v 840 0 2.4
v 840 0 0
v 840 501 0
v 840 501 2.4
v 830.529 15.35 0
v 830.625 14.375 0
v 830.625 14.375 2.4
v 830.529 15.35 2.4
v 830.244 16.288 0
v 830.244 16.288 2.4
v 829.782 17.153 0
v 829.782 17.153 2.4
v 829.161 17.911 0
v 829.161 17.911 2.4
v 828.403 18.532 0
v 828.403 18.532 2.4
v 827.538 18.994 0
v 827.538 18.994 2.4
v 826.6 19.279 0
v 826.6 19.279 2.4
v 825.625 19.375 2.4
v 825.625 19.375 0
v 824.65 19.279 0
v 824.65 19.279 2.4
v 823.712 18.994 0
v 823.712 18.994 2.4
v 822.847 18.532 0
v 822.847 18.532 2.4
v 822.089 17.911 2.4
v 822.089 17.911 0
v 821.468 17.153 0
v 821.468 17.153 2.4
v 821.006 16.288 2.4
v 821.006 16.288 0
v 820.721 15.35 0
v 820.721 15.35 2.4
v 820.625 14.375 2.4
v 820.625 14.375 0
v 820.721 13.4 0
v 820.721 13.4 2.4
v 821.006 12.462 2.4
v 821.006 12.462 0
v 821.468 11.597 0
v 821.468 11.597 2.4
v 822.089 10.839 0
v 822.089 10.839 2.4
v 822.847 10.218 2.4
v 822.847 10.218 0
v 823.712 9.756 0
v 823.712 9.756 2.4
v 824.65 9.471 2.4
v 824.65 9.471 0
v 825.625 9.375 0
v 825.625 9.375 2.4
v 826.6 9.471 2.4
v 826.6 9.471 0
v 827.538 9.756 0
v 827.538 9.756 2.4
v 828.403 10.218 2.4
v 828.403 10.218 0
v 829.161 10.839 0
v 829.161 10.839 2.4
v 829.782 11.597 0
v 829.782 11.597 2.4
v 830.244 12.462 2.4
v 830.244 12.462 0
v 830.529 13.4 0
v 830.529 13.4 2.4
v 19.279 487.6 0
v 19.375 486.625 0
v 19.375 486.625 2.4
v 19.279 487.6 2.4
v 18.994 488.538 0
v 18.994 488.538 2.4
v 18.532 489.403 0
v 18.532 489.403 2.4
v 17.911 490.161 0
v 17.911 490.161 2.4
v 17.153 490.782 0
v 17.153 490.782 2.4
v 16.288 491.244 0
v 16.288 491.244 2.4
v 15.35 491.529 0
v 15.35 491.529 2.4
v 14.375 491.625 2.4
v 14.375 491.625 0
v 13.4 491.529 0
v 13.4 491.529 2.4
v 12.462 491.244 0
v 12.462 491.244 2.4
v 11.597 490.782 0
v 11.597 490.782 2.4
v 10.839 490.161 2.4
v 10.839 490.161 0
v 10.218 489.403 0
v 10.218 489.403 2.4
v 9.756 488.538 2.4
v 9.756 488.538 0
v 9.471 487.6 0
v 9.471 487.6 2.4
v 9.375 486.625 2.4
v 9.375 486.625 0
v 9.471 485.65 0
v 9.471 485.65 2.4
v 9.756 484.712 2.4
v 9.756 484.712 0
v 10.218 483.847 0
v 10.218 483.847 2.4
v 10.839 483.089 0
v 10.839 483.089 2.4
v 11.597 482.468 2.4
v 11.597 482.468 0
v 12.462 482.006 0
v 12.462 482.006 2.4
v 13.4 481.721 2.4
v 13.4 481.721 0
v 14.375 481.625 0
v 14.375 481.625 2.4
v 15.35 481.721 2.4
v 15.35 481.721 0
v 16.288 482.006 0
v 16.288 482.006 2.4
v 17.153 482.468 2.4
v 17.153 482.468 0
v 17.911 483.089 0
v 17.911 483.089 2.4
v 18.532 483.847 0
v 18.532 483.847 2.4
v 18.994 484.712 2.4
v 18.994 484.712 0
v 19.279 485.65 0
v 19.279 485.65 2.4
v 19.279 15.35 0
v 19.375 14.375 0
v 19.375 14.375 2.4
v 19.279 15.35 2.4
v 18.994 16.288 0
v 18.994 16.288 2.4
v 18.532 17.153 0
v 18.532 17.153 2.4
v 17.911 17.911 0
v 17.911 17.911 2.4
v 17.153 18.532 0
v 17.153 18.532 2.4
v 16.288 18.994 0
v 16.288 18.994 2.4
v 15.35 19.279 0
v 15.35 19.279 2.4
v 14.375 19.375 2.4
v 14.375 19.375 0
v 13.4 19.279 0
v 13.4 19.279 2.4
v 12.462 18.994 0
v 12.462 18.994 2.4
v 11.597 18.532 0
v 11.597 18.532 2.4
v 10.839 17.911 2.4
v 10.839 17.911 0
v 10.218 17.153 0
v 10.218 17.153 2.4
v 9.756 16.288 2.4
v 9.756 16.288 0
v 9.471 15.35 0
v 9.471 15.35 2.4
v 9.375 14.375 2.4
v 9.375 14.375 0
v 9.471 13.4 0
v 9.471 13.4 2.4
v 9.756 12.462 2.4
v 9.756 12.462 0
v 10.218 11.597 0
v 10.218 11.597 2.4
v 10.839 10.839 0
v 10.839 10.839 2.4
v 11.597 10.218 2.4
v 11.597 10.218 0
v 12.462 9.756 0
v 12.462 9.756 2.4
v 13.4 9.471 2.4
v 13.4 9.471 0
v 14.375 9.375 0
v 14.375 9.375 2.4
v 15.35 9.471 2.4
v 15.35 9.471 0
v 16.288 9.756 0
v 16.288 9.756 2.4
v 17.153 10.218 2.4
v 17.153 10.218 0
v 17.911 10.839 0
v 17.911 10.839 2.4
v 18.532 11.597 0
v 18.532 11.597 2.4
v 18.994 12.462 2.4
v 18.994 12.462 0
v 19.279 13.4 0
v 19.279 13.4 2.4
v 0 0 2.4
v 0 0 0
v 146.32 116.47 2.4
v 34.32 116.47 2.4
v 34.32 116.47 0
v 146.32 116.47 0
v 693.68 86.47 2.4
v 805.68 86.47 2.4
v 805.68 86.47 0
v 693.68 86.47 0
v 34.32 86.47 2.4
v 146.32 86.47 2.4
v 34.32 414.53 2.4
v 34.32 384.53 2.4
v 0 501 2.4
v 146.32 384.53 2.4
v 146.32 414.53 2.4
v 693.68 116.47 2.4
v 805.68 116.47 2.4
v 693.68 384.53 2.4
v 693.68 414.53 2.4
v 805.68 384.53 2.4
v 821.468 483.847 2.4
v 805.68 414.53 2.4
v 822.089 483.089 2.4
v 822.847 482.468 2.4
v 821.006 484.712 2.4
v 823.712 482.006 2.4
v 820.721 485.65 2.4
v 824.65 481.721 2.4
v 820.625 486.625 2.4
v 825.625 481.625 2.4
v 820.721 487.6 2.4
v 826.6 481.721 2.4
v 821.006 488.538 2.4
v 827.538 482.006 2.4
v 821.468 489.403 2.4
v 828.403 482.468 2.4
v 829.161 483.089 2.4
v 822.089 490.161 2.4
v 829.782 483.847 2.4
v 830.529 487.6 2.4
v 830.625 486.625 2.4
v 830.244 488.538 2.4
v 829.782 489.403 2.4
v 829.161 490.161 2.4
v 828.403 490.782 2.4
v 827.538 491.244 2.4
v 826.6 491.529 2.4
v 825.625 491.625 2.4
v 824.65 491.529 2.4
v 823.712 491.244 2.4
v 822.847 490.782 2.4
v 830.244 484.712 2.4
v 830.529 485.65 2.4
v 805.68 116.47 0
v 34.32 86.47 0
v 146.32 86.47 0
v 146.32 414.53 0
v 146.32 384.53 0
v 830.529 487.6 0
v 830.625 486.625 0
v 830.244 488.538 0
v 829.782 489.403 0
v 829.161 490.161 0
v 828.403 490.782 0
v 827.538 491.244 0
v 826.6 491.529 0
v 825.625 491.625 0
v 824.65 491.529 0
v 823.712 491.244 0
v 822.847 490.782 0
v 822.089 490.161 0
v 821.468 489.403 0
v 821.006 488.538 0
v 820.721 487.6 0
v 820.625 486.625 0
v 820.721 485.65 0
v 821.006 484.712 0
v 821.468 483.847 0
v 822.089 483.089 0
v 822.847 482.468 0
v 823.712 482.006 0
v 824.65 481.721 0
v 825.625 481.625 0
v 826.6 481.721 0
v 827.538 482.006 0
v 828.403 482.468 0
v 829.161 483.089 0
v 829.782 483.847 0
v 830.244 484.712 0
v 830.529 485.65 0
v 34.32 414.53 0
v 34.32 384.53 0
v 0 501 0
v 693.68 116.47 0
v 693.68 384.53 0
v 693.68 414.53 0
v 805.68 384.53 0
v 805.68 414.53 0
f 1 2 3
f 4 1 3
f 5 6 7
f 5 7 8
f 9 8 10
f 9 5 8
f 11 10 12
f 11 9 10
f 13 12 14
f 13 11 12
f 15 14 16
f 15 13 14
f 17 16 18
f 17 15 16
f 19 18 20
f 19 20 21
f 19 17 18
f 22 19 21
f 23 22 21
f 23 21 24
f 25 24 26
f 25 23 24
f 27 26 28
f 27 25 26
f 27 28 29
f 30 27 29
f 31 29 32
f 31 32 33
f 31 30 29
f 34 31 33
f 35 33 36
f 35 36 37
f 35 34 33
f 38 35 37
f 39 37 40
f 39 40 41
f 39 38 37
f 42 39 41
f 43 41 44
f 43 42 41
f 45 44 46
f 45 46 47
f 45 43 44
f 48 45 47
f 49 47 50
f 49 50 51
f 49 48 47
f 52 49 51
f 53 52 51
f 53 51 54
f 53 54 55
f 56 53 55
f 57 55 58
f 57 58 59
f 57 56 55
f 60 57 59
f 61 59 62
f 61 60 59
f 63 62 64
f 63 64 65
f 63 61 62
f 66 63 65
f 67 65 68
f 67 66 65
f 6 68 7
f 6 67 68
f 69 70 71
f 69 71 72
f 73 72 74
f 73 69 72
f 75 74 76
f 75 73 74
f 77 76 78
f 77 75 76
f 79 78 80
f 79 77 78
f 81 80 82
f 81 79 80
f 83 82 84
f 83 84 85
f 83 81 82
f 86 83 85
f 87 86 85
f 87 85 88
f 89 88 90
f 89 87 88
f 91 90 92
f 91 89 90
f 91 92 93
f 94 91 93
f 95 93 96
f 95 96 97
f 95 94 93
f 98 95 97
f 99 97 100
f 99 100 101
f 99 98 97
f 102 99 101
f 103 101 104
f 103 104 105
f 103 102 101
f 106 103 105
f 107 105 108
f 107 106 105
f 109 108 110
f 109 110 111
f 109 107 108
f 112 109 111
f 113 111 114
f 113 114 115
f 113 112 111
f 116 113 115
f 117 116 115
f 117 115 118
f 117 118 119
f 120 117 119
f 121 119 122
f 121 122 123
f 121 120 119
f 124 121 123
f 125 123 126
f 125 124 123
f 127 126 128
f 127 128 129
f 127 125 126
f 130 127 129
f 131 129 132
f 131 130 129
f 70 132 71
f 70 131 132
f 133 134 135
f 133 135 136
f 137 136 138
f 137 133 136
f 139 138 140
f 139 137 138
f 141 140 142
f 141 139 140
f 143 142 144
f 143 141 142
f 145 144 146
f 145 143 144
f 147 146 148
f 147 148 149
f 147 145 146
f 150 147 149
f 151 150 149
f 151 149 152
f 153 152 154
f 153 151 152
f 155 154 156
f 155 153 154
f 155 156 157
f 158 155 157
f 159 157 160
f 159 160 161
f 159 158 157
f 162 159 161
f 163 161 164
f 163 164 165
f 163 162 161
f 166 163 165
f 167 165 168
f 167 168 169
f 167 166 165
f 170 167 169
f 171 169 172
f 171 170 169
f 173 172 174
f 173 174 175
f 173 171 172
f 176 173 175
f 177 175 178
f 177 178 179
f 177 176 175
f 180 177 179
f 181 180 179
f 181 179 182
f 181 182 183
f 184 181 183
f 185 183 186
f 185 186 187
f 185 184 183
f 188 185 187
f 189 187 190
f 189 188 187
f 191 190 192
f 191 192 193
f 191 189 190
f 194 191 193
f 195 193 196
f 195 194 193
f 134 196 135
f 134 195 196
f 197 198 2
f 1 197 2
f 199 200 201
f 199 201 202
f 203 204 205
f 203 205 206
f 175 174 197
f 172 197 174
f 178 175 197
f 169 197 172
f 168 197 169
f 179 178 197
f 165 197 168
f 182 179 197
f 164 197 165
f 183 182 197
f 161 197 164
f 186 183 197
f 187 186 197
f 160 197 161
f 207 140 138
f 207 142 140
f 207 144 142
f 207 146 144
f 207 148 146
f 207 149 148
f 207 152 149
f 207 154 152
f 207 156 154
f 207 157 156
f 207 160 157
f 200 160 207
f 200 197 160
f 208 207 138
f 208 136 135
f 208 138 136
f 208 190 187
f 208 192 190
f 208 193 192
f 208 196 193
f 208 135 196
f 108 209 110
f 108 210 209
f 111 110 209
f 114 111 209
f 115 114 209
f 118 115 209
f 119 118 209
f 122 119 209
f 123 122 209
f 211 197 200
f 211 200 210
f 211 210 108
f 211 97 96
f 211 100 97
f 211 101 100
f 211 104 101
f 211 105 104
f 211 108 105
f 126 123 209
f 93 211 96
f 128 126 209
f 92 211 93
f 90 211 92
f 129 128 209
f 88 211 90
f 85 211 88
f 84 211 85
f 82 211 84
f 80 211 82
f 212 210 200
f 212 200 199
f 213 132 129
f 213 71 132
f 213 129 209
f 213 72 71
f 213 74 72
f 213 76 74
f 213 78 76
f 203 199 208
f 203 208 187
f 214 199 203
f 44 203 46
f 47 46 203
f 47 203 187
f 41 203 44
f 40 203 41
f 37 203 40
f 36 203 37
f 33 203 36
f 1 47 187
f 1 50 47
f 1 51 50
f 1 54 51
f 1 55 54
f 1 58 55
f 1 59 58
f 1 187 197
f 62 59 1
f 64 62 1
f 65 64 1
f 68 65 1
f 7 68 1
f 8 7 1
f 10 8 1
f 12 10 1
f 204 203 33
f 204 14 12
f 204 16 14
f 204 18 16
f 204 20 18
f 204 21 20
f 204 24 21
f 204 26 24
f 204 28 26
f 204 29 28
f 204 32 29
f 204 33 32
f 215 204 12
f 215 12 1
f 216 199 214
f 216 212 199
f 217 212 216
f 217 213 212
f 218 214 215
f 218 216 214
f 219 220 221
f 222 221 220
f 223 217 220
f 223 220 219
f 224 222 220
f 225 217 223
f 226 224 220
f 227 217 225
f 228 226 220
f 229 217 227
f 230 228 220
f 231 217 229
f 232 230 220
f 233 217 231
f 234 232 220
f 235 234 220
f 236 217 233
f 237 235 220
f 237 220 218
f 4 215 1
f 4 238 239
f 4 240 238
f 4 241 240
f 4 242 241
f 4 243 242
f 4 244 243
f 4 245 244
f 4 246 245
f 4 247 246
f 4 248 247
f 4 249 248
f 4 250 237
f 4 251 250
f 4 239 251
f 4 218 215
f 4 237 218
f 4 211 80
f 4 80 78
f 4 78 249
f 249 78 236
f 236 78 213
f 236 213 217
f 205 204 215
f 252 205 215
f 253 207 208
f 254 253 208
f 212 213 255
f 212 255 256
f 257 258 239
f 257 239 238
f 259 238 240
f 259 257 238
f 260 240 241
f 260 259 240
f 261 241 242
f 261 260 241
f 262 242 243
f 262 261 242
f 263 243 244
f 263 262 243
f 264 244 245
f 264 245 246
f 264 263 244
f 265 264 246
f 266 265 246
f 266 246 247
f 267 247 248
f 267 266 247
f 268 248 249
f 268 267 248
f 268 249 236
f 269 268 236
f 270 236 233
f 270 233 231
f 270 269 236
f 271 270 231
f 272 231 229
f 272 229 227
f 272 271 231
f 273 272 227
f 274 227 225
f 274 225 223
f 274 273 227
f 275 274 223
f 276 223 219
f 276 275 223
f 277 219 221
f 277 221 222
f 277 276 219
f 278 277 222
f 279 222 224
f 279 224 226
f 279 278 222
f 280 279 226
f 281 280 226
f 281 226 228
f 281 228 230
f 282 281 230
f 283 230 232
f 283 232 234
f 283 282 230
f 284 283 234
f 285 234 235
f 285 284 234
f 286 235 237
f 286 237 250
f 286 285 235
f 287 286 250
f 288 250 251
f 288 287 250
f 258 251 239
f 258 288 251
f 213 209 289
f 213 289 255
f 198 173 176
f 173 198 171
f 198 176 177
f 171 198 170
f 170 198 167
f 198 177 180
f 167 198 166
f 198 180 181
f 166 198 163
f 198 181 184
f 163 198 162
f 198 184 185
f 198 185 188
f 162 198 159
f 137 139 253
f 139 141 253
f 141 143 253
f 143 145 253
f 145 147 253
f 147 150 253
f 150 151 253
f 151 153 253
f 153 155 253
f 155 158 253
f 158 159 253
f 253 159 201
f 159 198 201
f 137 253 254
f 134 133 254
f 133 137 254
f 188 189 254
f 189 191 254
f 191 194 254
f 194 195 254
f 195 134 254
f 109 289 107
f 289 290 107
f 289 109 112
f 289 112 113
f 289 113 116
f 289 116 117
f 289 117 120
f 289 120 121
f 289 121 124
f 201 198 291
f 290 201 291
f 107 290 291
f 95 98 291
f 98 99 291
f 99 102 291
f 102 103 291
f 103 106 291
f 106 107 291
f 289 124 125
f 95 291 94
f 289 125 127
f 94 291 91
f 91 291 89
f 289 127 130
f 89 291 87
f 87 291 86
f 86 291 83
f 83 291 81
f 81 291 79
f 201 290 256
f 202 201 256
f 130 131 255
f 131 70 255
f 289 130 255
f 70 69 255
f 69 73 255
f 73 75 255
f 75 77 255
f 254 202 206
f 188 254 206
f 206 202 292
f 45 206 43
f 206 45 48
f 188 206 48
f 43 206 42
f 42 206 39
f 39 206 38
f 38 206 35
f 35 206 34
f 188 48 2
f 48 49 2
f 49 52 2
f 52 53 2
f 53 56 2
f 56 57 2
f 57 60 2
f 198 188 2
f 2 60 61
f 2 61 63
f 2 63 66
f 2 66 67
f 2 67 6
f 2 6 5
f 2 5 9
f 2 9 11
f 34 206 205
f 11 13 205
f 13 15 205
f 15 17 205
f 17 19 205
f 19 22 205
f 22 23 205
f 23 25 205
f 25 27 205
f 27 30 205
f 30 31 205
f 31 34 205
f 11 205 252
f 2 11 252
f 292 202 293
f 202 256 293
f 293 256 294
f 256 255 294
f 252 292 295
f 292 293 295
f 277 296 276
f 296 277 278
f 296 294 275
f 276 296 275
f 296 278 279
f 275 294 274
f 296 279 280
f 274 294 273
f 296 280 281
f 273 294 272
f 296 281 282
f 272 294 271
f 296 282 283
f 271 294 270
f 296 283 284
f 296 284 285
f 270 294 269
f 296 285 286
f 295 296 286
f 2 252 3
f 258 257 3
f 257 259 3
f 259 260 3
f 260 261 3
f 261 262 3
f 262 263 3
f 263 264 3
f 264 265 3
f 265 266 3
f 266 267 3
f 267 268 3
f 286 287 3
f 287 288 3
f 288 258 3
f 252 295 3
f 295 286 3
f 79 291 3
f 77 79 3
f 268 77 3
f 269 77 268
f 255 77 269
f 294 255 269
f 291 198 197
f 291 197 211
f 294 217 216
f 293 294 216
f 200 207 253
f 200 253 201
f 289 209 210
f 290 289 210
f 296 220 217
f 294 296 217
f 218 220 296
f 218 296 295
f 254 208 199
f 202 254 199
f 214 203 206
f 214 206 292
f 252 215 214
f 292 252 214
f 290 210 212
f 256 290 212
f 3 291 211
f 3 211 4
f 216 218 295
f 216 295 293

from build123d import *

# Parameters (mm, degrees)
SKETCH1_W               = 840
SKETCH1_H               = 501
SKETCH1_R               = 5
BOSS_EXTRUDE1_DEPTH     = 2.4
SKETCH2_W               = 112
SKETCH2_H               = 30
CUT_EXTRUDE1_DEPTH      = 34
MIRROR2_COPY_1_SKETCH_W = 112
MIRROR2_COPY_1_SKETCH_H = 30
MIRROR2_COPY_1_DEPTH    = 34


with BuildPart() as part:
    # Sketch1 → Boss-Extrude1 (new body)
    with BuildSketch(Plane.XY):
        with Locations((420, 250.5)):
            Rectangle(SKETCH1_W, SKETCH1_H)
        with Locations((825.625, 486.625)):
            Circle(SKETCH1_R, mode=Mode.SUBTRACT)
        with Locations((14.375, 14.375)):
            Circle(SKETCH1_R, mode=Mode.SUBTRACT)
        with Locations((14.375, 486.625)):
            Circle(SKETCH1_R, mode=Mode.SUBTRACT)
        with Locations((825.625, 14.375)):
            Circle(SKETCH1_R, mode=Mode.SUBTRACT)
    extrude(amount=BOSS_EXTRUDE1_DEPTH)

    # Sketch2 → Cut-Extrude1 (cut)
    with BuildSketch(Plane.XY.offset(2.4)):
        with Locations((90.32, 101.47)):
            Rectangle(SKETCH2_W, SKETCH2_H)
    cut_extrude1 = extrude(amount=-CUT_EXTRUDE1_DEPTH, mode=Mode.SUBTRACT)

    # Mirror1: Cut-Extrude1 across plane
    add(cut_extrude1.mirror(Plane(origin=(420, 0, 0), x_dir=(0, 0, 1), z_dir=(1, 0, 0))), mode=Mode.SUBTRACT)

    # Mirror2: Cut-Extrude1 across plane
    add(cut_extrude1.mirror(Plane(origin=(0, 250.5, 0), x_dir=(0, 0, 1), z_dir=(0, -1, 0))), mode=Mode.SUBTRACT)

    # Mirror2 copy 1 sketch → Mirror2 copy 1 (cut)
    with BuildSketch(Plane(origin=(840, 501, 2.4), x_dir=(-1, 0, 0), z_dir=(0, 0, 1))):
        with Locations((90.32, 101.47)):
            Rectangle(MIRROR2_COPY_1_SKETCH_W, MIRROR2_COPY_1_SKETCH_H)
    extrude(amount=-MIRROR2_COPY_1_DEPTH, mode=Mode.SUBTRACT)


solid = part.part
